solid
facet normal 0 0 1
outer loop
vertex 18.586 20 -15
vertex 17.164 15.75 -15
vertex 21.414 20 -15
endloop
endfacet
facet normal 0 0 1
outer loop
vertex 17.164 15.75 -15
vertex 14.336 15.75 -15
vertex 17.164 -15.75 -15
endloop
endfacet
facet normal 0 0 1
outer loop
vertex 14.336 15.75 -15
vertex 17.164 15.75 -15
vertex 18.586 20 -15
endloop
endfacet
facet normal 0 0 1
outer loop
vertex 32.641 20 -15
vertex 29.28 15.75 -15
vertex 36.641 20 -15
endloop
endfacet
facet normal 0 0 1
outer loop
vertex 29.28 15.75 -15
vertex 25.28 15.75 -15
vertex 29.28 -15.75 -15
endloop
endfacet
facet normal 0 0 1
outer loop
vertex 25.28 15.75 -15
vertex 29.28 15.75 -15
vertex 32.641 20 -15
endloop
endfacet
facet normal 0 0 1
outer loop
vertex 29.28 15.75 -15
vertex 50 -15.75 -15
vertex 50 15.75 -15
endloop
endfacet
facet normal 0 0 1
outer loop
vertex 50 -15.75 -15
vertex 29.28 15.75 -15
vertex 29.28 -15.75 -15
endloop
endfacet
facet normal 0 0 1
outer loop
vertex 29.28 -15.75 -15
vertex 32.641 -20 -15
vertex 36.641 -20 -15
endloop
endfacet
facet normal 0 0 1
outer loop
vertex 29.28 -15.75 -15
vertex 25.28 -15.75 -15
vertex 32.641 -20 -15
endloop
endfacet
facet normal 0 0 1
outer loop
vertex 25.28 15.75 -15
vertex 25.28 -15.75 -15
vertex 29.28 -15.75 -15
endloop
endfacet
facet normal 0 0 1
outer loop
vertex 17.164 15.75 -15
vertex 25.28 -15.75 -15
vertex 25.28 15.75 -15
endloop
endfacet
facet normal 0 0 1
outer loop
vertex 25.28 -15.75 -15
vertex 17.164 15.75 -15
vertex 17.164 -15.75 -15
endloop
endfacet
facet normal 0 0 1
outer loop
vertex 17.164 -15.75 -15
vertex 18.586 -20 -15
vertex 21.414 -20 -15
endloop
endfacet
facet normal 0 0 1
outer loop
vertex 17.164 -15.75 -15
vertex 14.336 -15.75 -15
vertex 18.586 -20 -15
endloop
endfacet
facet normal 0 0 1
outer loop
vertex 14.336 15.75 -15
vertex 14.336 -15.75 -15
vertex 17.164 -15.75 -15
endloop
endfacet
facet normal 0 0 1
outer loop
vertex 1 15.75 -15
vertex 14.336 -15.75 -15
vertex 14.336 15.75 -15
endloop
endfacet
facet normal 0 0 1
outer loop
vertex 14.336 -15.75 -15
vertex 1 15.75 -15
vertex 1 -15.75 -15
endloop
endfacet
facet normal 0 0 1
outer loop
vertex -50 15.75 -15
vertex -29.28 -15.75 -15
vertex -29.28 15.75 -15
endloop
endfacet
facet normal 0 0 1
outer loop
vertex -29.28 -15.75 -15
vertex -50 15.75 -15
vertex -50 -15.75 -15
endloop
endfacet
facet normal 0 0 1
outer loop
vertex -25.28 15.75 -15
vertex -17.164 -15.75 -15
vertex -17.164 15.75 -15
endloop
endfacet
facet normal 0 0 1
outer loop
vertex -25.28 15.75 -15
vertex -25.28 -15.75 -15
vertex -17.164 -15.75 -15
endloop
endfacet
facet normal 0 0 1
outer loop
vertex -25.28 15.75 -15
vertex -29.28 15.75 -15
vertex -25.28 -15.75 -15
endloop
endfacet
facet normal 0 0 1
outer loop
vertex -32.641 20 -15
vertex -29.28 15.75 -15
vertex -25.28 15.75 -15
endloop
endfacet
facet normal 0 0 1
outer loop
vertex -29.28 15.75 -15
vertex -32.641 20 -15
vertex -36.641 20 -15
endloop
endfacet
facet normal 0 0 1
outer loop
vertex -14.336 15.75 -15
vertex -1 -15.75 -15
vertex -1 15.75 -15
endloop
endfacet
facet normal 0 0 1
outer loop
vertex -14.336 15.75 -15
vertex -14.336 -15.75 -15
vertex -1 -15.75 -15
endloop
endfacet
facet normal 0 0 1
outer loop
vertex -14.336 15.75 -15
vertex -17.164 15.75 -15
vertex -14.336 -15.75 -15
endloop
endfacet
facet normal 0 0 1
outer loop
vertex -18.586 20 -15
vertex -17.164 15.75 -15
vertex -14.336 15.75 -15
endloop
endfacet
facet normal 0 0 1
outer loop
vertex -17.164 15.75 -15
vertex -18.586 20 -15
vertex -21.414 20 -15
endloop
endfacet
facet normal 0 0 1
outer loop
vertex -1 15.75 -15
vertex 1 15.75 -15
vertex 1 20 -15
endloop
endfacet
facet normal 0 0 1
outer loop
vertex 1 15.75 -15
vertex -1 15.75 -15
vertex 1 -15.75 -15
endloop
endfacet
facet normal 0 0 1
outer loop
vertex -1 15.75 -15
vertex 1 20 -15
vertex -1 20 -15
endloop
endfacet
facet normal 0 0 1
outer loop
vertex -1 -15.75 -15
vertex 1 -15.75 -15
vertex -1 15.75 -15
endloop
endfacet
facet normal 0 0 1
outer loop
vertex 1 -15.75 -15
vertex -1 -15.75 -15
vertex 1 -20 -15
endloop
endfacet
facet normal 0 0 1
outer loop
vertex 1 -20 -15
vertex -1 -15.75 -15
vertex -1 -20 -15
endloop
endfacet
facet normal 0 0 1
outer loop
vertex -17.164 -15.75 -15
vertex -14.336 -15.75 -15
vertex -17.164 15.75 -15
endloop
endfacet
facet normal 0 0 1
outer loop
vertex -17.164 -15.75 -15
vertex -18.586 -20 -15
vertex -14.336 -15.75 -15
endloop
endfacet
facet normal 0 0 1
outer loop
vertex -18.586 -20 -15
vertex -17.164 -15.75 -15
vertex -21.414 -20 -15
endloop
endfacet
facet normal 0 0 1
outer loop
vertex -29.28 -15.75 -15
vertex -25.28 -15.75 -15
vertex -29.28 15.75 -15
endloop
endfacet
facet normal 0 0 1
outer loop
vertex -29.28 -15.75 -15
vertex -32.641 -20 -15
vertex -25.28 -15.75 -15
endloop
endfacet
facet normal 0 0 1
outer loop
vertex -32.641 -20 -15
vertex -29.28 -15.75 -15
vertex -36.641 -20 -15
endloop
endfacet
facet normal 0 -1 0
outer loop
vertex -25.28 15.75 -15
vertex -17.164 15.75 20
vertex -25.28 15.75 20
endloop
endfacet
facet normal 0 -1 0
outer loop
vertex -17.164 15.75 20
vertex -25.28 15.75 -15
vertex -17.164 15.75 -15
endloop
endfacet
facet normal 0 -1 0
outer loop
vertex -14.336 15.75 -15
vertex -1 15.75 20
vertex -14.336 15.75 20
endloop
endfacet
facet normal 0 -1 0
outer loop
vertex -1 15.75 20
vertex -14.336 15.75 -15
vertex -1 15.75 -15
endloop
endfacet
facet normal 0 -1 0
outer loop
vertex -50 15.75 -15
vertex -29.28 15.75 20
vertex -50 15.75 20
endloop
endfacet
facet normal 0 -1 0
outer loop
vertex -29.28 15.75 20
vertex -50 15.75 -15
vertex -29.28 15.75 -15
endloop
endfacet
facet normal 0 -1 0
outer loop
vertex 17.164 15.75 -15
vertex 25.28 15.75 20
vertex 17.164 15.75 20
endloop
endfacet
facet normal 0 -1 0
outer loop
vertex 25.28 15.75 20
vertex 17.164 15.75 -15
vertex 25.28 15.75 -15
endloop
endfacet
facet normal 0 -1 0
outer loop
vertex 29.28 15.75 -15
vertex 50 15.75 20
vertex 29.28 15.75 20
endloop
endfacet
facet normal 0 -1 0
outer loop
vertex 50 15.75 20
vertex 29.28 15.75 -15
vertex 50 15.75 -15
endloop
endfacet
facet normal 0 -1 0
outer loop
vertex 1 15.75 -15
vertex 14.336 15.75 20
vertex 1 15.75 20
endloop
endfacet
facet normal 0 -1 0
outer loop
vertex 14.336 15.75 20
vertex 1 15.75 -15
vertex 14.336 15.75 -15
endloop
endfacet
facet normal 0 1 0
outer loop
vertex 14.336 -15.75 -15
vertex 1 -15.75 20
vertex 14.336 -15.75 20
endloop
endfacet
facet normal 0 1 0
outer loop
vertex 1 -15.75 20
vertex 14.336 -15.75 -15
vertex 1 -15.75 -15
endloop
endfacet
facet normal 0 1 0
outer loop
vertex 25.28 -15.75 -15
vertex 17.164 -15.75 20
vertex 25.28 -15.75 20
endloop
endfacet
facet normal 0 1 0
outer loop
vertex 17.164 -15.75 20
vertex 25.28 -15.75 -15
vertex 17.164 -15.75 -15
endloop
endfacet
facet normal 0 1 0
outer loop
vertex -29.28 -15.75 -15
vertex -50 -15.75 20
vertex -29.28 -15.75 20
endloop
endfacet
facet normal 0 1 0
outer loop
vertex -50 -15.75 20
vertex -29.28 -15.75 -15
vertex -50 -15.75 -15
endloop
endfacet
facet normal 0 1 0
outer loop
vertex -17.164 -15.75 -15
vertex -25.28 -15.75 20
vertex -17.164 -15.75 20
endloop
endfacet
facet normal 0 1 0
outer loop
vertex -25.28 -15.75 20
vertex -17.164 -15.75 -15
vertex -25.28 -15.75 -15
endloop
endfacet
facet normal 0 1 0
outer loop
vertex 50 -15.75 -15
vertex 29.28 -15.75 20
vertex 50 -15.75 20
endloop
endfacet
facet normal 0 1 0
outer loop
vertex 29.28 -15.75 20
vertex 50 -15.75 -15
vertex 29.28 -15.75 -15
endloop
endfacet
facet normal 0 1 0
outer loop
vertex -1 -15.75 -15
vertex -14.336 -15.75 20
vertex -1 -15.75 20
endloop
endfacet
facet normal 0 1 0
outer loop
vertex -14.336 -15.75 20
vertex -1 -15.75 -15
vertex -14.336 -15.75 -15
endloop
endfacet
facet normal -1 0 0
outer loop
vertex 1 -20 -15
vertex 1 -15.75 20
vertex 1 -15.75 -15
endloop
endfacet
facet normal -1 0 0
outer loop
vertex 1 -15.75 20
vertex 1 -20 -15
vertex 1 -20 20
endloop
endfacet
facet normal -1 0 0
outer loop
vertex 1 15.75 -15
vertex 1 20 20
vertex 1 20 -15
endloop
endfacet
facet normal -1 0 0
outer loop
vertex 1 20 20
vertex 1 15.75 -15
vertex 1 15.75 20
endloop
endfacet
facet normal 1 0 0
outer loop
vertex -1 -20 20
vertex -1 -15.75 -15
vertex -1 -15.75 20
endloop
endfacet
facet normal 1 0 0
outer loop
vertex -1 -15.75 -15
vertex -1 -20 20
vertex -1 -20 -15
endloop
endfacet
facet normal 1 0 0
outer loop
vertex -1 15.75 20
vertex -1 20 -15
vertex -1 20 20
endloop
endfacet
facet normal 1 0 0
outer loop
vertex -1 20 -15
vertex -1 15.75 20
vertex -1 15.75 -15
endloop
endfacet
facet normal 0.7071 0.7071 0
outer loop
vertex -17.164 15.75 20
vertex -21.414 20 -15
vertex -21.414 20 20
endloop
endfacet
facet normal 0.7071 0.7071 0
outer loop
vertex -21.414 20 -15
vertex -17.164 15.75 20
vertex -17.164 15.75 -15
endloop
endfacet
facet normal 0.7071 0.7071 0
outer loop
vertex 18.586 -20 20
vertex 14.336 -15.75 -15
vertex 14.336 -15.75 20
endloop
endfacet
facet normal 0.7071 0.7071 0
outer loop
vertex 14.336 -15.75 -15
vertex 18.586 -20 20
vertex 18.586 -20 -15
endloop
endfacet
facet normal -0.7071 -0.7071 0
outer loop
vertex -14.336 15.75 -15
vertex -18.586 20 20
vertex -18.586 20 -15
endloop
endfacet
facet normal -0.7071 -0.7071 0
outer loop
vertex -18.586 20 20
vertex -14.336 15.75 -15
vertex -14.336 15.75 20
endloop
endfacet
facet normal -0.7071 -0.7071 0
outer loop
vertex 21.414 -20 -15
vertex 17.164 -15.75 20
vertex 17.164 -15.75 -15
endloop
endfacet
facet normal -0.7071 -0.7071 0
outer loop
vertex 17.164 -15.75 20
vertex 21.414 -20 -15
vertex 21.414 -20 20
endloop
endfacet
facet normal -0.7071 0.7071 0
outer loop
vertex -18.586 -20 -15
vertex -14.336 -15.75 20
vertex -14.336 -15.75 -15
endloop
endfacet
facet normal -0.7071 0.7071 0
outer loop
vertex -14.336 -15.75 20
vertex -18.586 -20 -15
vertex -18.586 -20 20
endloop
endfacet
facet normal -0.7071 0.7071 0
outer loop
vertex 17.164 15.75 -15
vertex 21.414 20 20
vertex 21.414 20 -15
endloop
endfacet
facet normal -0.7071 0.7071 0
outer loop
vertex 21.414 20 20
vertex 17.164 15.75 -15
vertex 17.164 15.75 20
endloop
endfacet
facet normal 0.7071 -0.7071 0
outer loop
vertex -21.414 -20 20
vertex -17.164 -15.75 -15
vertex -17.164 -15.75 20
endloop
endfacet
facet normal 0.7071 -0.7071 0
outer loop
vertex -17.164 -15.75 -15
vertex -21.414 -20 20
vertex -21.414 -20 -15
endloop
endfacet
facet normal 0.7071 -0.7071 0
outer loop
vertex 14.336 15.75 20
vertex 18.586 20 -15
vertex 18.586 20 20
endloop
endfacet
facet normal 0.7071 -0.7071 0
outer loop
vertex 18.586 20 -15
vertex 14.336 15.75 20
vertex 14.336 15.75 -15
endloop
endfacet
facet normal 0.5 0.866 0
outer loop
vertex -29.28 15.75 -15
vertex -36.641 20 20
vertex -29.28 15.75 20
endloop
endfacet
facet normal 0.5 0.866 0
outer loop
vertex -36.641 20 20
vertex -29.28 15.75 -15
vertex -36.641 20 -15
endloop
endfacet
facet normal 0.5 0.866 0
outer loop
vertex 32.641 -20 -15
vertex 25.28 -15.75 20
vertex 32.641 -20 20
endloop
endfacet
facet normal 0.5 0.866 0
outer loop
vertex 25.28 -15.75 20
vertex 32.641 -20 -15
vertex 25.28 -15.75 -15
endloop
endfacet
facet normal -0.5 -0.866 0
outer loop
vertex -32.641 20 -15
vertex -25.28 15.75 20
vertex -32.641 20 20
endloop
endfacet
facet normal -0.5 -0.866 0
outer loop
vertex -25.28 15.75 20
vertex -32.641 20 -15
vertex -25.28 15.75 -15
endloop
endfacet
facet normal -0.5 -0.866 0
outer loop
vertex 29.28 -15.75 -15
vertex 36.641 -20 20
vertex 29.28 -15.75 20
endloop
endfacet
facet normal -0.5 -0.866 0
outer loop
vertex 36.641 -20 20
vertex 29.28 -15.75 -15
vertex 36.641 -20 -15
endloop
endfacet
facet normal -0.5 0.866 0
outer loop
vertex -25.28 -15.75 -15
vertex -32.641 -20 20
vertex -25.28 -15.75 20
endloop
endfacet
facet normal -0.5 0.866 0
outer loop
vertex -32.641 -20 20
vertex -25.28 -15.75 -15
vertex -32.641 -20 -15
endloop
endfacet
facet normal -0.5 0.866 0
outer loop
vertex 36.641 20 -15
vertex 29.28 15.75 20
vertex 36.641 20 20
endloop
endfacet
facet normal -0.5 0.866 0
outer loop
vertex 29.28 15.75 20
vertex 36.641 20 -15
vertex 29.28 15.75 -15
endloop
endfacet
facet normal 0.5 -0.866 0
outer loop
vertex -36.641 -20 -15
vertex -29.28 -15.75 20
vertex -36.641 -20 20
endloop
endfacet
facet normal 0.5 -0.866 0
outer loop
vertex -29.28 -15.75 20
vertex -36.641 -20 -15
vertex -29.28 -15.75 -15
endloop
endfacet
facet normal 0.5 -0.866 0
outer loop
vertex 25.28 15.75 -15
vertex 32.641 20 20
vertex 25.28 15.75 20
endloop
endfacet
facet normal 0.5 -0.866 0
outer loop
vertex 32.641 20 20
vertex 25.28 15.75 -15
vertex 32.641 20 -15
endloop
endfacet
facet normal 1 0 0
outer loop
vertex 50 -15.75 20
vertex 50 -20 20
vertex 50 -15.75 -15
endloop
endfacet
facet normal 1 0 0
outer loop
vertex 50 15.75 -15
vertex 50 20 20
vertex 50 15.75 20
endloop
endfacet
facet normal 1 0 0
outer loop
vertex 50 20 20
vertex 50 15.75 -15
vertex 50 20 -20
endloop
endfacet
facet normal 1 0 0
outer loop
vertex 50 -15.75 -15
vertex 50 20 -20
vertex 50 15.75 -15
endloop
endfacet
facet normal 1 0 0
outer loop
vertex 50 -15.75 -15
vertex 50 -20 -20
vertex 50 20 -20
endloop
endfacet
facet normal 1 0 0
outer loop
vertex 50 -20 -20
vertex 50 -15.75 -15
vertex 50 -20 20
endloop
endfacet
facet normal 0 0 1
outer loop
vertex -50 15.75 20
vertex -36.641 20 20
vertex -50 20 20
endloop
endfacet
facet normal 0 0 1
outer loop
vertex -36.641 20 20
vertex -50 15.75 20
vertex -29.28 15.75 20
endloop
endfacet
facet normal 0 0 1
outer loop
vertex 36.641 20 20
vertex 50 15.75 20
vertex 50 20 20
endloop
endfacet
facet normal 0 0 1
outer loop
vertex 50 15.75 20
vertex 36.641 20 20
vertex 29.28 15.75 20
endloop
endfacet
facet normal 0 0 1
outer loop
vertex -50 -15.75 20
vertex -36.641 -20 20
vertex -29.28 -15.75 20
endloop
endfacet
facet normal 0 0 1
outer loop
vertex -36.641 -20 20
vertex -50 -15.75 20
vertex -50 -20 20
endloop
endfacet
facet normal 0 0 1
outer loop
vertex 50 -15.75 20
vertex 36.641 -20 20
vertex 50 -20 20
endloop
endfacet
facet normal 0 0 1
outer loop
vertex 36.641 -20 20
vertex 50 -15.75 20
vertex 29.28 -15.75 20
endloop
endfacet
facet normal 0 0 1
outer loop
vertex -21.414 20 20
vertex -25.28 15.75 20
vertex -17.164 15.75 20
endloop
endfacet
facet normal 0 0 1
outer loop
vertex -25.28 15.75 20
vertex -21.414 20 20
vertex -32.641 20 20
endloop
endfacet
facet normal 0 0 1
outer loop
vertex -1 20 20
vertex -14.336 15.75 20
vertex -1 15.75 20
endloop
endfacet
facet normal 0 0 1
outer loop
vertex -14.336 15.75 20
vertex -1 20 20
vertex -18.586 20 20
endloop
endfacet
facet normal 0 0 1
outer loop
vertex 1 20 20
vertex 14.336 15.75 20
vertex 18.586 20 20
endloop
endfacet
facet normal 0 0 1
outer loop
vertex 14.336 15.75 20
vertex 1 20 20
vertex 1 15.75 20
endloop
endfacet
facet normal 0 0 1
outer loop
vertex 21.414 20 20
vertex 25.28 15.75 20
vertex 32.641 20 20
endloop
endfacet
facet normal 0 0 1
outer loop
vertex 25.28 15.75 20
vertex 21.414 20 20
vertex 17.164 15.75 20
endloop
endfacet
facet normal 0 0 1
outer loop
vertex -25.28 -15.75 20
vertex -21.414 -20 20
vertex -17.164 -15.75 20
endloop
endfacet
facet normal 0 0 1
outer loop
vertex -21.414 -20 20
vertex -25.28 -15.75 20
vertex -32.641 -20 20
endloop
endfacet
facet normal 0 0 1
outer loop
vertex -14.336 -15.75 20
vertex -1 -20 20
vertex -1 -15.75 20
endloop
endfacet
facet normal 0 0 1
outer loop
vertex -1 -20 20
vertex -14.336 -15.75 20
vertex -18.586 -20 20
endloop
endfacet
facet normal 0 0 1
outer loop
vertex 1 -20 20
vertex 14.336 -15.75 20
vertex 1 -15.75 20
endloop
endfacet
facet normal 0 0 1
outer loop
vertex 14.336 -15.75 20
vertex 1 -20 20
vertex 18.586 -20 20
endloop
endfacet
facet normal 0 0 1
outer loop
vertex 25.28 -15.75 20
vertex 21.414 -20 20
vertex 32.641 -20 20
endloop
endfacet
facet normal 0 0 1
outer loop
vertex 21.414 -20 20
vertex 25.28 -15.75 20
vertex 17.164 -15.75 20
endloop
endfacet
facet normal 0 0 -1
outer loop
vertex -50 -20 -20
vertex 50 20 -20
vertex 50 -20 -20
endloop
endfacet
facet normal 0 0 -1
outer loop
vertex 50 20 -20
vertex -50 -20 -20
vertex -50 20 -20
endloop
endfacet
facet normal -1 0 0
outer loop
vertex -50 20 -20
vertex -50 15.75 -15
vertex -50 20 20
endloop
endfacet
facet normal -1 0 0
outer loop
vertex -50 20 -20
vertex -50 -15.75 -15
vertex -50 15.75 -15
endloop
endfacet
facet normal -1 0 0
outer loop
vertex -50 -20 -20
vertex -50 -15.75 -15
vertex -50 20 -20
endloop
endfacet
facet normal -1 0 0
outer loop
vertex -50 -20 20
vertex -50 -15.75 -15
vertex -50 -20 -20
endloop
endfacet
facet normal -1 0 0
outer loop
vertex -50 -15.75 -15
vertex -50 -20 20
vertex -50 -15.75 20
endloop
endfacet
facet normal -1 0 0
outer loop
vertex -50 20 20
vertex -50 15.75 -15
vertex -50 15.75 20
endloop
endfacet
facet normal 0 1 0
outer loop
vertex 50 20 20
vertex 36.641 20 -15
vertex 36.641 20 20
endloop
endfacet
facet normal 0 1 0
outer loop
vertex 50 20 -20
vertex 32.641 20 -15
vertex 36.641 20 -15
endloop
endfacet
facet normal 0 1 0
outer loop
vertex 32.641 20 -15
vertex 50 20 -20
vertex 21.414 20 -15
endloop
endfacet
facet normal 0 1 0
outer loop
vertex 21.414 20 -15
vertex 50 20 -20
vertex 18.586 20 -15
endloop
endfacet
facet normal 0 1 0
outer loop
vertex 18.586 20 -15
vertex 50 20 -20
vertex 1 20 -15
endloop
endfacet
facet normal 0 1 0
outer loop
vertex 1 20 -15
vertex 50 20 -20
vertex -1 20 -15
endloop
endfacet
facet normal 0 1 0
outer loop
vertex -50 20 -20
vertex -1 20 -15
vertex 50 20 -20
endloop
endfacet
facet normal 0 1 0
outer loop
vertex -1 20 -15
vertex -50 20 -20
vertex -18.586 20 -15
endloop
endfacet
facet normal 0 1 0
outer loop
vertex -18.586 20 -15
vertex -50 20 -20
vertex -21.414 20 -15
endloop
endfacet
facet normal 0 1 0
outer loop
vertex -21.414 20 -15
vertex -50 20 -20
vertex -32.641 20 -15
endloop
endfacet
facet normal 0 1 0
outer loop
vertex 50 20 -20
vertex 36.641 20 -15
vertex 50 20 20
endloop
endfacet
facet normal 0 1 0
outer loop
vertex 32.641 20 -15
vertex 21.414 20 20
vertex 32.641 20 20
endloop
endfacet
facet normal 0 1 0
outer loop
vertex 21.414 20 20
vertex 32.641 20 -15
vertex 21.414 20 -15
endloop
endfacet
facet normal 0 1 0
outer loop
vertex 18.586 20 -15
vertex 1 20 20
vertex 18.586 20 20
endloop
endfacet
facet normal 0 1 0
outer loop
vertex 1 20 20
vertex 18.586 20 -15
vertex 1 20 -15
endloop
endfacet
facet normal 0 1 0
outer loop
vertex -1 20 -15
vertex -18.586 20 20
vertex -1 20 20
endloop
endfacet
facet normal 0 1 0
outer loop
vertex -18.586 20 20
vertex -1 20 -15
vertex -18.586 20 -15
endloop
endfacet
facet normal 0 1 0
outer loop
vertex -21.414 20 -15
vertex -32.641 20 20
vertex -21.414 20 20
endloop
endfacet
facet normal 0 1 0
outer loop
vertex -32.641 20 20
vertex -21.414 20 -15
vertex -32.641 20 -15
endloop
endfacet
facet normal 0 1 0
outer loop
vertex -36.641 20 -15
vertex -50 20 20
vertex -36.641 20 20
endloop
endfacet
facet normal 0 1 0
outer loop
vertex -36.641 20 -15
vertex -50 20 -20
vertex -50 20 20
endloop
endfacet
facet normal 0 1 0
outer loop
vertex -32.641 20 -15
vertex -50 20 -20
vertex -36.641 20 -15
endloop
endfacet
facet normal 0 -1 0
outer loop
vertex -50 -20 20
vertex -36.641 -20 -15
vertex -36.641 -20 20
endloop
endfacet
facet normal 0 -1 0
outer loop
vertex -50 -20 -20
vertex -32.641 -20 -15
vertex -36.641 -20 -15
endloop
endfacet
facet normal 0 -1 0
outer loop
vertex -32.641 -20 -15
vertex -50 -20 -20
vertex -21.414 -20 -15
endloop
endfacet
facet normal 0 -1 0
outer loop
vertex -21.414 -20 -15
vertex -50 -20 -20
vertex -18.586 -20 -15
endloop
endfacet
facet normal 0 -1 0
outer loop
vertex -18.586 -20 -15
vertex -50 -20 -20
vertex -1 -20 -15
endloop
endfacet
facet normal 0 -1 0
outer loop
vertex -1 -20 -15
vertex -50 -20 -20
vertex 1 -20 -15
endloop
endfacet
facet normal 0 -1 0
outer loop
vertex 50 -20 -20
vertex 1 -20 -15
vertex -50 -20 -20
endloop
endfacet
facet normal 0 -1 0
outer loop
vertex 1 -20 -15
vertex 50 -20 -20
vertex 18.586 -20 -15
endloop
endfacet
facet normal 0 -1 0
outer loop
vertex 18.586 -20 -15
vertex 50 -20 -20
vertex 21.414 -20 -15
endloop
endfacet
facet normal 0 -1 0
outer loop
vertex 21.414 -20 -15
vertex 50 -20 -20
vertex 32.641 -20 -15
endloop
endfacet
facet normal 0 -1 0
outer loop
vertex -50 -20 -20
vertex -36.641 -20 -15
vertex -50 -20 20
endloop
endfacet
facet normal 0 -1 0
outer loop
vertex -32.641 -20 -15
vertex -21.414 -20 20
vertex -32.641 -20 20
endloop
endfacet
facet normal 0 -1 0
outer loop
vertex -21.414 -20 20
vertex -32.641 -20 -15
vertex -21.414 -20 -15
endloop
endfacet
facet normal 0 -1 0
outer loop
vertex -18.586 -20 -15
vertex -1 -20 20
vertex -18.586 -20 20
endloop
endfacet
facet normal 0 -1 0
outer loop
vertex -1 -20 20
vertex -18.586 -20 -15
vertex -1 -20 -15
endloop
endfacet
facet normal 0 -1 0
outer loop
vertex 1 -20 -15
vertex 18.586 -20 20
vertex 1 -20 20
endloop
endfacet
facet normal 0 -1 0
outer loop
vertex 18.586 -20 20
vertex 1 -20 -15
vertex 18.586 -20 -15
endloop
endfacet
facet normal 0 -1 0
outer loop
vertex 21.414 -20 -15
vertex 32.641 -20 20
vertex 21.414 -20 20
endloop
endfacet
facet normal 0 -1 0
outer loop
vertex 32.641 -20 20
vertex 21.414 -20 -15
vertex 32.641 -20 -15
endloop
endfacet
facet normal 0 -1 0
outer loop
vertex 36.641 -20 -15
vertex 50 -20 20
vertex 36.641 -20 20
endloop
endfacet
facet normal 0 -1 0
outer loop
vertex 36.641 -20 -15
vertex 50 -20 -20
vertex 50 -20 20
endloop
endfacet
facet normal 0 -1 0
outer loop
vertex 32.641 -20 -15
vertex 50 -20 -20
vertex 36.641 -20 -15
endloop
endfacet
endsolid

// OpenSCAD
x=100;
y=30;
z=30;
cut=2;
module miter(){
difference(){
cube([x,y+10,z+10],true);
union(){
translate([0,0,5])cube([x+12,y+1.5,z+10],true);
translate([0,0,5])cube([cut,y*2,z+10],true); //90
rotate([0,0,45])translate([0,0,5])cube([cut,y*3,z+10],true); //45
rotate([0,0,-45])translate([0,0,5])cube([cut,y*3,z+10],true); //-45
rotate([0,0,60])translate([0,0,5])cube([cut,y*3,z+10],true); //60
rotate([0,0,-60])translate([0,0,5])cube([cut,y*3,z+10],true); //-60
}
}
}


miter();
